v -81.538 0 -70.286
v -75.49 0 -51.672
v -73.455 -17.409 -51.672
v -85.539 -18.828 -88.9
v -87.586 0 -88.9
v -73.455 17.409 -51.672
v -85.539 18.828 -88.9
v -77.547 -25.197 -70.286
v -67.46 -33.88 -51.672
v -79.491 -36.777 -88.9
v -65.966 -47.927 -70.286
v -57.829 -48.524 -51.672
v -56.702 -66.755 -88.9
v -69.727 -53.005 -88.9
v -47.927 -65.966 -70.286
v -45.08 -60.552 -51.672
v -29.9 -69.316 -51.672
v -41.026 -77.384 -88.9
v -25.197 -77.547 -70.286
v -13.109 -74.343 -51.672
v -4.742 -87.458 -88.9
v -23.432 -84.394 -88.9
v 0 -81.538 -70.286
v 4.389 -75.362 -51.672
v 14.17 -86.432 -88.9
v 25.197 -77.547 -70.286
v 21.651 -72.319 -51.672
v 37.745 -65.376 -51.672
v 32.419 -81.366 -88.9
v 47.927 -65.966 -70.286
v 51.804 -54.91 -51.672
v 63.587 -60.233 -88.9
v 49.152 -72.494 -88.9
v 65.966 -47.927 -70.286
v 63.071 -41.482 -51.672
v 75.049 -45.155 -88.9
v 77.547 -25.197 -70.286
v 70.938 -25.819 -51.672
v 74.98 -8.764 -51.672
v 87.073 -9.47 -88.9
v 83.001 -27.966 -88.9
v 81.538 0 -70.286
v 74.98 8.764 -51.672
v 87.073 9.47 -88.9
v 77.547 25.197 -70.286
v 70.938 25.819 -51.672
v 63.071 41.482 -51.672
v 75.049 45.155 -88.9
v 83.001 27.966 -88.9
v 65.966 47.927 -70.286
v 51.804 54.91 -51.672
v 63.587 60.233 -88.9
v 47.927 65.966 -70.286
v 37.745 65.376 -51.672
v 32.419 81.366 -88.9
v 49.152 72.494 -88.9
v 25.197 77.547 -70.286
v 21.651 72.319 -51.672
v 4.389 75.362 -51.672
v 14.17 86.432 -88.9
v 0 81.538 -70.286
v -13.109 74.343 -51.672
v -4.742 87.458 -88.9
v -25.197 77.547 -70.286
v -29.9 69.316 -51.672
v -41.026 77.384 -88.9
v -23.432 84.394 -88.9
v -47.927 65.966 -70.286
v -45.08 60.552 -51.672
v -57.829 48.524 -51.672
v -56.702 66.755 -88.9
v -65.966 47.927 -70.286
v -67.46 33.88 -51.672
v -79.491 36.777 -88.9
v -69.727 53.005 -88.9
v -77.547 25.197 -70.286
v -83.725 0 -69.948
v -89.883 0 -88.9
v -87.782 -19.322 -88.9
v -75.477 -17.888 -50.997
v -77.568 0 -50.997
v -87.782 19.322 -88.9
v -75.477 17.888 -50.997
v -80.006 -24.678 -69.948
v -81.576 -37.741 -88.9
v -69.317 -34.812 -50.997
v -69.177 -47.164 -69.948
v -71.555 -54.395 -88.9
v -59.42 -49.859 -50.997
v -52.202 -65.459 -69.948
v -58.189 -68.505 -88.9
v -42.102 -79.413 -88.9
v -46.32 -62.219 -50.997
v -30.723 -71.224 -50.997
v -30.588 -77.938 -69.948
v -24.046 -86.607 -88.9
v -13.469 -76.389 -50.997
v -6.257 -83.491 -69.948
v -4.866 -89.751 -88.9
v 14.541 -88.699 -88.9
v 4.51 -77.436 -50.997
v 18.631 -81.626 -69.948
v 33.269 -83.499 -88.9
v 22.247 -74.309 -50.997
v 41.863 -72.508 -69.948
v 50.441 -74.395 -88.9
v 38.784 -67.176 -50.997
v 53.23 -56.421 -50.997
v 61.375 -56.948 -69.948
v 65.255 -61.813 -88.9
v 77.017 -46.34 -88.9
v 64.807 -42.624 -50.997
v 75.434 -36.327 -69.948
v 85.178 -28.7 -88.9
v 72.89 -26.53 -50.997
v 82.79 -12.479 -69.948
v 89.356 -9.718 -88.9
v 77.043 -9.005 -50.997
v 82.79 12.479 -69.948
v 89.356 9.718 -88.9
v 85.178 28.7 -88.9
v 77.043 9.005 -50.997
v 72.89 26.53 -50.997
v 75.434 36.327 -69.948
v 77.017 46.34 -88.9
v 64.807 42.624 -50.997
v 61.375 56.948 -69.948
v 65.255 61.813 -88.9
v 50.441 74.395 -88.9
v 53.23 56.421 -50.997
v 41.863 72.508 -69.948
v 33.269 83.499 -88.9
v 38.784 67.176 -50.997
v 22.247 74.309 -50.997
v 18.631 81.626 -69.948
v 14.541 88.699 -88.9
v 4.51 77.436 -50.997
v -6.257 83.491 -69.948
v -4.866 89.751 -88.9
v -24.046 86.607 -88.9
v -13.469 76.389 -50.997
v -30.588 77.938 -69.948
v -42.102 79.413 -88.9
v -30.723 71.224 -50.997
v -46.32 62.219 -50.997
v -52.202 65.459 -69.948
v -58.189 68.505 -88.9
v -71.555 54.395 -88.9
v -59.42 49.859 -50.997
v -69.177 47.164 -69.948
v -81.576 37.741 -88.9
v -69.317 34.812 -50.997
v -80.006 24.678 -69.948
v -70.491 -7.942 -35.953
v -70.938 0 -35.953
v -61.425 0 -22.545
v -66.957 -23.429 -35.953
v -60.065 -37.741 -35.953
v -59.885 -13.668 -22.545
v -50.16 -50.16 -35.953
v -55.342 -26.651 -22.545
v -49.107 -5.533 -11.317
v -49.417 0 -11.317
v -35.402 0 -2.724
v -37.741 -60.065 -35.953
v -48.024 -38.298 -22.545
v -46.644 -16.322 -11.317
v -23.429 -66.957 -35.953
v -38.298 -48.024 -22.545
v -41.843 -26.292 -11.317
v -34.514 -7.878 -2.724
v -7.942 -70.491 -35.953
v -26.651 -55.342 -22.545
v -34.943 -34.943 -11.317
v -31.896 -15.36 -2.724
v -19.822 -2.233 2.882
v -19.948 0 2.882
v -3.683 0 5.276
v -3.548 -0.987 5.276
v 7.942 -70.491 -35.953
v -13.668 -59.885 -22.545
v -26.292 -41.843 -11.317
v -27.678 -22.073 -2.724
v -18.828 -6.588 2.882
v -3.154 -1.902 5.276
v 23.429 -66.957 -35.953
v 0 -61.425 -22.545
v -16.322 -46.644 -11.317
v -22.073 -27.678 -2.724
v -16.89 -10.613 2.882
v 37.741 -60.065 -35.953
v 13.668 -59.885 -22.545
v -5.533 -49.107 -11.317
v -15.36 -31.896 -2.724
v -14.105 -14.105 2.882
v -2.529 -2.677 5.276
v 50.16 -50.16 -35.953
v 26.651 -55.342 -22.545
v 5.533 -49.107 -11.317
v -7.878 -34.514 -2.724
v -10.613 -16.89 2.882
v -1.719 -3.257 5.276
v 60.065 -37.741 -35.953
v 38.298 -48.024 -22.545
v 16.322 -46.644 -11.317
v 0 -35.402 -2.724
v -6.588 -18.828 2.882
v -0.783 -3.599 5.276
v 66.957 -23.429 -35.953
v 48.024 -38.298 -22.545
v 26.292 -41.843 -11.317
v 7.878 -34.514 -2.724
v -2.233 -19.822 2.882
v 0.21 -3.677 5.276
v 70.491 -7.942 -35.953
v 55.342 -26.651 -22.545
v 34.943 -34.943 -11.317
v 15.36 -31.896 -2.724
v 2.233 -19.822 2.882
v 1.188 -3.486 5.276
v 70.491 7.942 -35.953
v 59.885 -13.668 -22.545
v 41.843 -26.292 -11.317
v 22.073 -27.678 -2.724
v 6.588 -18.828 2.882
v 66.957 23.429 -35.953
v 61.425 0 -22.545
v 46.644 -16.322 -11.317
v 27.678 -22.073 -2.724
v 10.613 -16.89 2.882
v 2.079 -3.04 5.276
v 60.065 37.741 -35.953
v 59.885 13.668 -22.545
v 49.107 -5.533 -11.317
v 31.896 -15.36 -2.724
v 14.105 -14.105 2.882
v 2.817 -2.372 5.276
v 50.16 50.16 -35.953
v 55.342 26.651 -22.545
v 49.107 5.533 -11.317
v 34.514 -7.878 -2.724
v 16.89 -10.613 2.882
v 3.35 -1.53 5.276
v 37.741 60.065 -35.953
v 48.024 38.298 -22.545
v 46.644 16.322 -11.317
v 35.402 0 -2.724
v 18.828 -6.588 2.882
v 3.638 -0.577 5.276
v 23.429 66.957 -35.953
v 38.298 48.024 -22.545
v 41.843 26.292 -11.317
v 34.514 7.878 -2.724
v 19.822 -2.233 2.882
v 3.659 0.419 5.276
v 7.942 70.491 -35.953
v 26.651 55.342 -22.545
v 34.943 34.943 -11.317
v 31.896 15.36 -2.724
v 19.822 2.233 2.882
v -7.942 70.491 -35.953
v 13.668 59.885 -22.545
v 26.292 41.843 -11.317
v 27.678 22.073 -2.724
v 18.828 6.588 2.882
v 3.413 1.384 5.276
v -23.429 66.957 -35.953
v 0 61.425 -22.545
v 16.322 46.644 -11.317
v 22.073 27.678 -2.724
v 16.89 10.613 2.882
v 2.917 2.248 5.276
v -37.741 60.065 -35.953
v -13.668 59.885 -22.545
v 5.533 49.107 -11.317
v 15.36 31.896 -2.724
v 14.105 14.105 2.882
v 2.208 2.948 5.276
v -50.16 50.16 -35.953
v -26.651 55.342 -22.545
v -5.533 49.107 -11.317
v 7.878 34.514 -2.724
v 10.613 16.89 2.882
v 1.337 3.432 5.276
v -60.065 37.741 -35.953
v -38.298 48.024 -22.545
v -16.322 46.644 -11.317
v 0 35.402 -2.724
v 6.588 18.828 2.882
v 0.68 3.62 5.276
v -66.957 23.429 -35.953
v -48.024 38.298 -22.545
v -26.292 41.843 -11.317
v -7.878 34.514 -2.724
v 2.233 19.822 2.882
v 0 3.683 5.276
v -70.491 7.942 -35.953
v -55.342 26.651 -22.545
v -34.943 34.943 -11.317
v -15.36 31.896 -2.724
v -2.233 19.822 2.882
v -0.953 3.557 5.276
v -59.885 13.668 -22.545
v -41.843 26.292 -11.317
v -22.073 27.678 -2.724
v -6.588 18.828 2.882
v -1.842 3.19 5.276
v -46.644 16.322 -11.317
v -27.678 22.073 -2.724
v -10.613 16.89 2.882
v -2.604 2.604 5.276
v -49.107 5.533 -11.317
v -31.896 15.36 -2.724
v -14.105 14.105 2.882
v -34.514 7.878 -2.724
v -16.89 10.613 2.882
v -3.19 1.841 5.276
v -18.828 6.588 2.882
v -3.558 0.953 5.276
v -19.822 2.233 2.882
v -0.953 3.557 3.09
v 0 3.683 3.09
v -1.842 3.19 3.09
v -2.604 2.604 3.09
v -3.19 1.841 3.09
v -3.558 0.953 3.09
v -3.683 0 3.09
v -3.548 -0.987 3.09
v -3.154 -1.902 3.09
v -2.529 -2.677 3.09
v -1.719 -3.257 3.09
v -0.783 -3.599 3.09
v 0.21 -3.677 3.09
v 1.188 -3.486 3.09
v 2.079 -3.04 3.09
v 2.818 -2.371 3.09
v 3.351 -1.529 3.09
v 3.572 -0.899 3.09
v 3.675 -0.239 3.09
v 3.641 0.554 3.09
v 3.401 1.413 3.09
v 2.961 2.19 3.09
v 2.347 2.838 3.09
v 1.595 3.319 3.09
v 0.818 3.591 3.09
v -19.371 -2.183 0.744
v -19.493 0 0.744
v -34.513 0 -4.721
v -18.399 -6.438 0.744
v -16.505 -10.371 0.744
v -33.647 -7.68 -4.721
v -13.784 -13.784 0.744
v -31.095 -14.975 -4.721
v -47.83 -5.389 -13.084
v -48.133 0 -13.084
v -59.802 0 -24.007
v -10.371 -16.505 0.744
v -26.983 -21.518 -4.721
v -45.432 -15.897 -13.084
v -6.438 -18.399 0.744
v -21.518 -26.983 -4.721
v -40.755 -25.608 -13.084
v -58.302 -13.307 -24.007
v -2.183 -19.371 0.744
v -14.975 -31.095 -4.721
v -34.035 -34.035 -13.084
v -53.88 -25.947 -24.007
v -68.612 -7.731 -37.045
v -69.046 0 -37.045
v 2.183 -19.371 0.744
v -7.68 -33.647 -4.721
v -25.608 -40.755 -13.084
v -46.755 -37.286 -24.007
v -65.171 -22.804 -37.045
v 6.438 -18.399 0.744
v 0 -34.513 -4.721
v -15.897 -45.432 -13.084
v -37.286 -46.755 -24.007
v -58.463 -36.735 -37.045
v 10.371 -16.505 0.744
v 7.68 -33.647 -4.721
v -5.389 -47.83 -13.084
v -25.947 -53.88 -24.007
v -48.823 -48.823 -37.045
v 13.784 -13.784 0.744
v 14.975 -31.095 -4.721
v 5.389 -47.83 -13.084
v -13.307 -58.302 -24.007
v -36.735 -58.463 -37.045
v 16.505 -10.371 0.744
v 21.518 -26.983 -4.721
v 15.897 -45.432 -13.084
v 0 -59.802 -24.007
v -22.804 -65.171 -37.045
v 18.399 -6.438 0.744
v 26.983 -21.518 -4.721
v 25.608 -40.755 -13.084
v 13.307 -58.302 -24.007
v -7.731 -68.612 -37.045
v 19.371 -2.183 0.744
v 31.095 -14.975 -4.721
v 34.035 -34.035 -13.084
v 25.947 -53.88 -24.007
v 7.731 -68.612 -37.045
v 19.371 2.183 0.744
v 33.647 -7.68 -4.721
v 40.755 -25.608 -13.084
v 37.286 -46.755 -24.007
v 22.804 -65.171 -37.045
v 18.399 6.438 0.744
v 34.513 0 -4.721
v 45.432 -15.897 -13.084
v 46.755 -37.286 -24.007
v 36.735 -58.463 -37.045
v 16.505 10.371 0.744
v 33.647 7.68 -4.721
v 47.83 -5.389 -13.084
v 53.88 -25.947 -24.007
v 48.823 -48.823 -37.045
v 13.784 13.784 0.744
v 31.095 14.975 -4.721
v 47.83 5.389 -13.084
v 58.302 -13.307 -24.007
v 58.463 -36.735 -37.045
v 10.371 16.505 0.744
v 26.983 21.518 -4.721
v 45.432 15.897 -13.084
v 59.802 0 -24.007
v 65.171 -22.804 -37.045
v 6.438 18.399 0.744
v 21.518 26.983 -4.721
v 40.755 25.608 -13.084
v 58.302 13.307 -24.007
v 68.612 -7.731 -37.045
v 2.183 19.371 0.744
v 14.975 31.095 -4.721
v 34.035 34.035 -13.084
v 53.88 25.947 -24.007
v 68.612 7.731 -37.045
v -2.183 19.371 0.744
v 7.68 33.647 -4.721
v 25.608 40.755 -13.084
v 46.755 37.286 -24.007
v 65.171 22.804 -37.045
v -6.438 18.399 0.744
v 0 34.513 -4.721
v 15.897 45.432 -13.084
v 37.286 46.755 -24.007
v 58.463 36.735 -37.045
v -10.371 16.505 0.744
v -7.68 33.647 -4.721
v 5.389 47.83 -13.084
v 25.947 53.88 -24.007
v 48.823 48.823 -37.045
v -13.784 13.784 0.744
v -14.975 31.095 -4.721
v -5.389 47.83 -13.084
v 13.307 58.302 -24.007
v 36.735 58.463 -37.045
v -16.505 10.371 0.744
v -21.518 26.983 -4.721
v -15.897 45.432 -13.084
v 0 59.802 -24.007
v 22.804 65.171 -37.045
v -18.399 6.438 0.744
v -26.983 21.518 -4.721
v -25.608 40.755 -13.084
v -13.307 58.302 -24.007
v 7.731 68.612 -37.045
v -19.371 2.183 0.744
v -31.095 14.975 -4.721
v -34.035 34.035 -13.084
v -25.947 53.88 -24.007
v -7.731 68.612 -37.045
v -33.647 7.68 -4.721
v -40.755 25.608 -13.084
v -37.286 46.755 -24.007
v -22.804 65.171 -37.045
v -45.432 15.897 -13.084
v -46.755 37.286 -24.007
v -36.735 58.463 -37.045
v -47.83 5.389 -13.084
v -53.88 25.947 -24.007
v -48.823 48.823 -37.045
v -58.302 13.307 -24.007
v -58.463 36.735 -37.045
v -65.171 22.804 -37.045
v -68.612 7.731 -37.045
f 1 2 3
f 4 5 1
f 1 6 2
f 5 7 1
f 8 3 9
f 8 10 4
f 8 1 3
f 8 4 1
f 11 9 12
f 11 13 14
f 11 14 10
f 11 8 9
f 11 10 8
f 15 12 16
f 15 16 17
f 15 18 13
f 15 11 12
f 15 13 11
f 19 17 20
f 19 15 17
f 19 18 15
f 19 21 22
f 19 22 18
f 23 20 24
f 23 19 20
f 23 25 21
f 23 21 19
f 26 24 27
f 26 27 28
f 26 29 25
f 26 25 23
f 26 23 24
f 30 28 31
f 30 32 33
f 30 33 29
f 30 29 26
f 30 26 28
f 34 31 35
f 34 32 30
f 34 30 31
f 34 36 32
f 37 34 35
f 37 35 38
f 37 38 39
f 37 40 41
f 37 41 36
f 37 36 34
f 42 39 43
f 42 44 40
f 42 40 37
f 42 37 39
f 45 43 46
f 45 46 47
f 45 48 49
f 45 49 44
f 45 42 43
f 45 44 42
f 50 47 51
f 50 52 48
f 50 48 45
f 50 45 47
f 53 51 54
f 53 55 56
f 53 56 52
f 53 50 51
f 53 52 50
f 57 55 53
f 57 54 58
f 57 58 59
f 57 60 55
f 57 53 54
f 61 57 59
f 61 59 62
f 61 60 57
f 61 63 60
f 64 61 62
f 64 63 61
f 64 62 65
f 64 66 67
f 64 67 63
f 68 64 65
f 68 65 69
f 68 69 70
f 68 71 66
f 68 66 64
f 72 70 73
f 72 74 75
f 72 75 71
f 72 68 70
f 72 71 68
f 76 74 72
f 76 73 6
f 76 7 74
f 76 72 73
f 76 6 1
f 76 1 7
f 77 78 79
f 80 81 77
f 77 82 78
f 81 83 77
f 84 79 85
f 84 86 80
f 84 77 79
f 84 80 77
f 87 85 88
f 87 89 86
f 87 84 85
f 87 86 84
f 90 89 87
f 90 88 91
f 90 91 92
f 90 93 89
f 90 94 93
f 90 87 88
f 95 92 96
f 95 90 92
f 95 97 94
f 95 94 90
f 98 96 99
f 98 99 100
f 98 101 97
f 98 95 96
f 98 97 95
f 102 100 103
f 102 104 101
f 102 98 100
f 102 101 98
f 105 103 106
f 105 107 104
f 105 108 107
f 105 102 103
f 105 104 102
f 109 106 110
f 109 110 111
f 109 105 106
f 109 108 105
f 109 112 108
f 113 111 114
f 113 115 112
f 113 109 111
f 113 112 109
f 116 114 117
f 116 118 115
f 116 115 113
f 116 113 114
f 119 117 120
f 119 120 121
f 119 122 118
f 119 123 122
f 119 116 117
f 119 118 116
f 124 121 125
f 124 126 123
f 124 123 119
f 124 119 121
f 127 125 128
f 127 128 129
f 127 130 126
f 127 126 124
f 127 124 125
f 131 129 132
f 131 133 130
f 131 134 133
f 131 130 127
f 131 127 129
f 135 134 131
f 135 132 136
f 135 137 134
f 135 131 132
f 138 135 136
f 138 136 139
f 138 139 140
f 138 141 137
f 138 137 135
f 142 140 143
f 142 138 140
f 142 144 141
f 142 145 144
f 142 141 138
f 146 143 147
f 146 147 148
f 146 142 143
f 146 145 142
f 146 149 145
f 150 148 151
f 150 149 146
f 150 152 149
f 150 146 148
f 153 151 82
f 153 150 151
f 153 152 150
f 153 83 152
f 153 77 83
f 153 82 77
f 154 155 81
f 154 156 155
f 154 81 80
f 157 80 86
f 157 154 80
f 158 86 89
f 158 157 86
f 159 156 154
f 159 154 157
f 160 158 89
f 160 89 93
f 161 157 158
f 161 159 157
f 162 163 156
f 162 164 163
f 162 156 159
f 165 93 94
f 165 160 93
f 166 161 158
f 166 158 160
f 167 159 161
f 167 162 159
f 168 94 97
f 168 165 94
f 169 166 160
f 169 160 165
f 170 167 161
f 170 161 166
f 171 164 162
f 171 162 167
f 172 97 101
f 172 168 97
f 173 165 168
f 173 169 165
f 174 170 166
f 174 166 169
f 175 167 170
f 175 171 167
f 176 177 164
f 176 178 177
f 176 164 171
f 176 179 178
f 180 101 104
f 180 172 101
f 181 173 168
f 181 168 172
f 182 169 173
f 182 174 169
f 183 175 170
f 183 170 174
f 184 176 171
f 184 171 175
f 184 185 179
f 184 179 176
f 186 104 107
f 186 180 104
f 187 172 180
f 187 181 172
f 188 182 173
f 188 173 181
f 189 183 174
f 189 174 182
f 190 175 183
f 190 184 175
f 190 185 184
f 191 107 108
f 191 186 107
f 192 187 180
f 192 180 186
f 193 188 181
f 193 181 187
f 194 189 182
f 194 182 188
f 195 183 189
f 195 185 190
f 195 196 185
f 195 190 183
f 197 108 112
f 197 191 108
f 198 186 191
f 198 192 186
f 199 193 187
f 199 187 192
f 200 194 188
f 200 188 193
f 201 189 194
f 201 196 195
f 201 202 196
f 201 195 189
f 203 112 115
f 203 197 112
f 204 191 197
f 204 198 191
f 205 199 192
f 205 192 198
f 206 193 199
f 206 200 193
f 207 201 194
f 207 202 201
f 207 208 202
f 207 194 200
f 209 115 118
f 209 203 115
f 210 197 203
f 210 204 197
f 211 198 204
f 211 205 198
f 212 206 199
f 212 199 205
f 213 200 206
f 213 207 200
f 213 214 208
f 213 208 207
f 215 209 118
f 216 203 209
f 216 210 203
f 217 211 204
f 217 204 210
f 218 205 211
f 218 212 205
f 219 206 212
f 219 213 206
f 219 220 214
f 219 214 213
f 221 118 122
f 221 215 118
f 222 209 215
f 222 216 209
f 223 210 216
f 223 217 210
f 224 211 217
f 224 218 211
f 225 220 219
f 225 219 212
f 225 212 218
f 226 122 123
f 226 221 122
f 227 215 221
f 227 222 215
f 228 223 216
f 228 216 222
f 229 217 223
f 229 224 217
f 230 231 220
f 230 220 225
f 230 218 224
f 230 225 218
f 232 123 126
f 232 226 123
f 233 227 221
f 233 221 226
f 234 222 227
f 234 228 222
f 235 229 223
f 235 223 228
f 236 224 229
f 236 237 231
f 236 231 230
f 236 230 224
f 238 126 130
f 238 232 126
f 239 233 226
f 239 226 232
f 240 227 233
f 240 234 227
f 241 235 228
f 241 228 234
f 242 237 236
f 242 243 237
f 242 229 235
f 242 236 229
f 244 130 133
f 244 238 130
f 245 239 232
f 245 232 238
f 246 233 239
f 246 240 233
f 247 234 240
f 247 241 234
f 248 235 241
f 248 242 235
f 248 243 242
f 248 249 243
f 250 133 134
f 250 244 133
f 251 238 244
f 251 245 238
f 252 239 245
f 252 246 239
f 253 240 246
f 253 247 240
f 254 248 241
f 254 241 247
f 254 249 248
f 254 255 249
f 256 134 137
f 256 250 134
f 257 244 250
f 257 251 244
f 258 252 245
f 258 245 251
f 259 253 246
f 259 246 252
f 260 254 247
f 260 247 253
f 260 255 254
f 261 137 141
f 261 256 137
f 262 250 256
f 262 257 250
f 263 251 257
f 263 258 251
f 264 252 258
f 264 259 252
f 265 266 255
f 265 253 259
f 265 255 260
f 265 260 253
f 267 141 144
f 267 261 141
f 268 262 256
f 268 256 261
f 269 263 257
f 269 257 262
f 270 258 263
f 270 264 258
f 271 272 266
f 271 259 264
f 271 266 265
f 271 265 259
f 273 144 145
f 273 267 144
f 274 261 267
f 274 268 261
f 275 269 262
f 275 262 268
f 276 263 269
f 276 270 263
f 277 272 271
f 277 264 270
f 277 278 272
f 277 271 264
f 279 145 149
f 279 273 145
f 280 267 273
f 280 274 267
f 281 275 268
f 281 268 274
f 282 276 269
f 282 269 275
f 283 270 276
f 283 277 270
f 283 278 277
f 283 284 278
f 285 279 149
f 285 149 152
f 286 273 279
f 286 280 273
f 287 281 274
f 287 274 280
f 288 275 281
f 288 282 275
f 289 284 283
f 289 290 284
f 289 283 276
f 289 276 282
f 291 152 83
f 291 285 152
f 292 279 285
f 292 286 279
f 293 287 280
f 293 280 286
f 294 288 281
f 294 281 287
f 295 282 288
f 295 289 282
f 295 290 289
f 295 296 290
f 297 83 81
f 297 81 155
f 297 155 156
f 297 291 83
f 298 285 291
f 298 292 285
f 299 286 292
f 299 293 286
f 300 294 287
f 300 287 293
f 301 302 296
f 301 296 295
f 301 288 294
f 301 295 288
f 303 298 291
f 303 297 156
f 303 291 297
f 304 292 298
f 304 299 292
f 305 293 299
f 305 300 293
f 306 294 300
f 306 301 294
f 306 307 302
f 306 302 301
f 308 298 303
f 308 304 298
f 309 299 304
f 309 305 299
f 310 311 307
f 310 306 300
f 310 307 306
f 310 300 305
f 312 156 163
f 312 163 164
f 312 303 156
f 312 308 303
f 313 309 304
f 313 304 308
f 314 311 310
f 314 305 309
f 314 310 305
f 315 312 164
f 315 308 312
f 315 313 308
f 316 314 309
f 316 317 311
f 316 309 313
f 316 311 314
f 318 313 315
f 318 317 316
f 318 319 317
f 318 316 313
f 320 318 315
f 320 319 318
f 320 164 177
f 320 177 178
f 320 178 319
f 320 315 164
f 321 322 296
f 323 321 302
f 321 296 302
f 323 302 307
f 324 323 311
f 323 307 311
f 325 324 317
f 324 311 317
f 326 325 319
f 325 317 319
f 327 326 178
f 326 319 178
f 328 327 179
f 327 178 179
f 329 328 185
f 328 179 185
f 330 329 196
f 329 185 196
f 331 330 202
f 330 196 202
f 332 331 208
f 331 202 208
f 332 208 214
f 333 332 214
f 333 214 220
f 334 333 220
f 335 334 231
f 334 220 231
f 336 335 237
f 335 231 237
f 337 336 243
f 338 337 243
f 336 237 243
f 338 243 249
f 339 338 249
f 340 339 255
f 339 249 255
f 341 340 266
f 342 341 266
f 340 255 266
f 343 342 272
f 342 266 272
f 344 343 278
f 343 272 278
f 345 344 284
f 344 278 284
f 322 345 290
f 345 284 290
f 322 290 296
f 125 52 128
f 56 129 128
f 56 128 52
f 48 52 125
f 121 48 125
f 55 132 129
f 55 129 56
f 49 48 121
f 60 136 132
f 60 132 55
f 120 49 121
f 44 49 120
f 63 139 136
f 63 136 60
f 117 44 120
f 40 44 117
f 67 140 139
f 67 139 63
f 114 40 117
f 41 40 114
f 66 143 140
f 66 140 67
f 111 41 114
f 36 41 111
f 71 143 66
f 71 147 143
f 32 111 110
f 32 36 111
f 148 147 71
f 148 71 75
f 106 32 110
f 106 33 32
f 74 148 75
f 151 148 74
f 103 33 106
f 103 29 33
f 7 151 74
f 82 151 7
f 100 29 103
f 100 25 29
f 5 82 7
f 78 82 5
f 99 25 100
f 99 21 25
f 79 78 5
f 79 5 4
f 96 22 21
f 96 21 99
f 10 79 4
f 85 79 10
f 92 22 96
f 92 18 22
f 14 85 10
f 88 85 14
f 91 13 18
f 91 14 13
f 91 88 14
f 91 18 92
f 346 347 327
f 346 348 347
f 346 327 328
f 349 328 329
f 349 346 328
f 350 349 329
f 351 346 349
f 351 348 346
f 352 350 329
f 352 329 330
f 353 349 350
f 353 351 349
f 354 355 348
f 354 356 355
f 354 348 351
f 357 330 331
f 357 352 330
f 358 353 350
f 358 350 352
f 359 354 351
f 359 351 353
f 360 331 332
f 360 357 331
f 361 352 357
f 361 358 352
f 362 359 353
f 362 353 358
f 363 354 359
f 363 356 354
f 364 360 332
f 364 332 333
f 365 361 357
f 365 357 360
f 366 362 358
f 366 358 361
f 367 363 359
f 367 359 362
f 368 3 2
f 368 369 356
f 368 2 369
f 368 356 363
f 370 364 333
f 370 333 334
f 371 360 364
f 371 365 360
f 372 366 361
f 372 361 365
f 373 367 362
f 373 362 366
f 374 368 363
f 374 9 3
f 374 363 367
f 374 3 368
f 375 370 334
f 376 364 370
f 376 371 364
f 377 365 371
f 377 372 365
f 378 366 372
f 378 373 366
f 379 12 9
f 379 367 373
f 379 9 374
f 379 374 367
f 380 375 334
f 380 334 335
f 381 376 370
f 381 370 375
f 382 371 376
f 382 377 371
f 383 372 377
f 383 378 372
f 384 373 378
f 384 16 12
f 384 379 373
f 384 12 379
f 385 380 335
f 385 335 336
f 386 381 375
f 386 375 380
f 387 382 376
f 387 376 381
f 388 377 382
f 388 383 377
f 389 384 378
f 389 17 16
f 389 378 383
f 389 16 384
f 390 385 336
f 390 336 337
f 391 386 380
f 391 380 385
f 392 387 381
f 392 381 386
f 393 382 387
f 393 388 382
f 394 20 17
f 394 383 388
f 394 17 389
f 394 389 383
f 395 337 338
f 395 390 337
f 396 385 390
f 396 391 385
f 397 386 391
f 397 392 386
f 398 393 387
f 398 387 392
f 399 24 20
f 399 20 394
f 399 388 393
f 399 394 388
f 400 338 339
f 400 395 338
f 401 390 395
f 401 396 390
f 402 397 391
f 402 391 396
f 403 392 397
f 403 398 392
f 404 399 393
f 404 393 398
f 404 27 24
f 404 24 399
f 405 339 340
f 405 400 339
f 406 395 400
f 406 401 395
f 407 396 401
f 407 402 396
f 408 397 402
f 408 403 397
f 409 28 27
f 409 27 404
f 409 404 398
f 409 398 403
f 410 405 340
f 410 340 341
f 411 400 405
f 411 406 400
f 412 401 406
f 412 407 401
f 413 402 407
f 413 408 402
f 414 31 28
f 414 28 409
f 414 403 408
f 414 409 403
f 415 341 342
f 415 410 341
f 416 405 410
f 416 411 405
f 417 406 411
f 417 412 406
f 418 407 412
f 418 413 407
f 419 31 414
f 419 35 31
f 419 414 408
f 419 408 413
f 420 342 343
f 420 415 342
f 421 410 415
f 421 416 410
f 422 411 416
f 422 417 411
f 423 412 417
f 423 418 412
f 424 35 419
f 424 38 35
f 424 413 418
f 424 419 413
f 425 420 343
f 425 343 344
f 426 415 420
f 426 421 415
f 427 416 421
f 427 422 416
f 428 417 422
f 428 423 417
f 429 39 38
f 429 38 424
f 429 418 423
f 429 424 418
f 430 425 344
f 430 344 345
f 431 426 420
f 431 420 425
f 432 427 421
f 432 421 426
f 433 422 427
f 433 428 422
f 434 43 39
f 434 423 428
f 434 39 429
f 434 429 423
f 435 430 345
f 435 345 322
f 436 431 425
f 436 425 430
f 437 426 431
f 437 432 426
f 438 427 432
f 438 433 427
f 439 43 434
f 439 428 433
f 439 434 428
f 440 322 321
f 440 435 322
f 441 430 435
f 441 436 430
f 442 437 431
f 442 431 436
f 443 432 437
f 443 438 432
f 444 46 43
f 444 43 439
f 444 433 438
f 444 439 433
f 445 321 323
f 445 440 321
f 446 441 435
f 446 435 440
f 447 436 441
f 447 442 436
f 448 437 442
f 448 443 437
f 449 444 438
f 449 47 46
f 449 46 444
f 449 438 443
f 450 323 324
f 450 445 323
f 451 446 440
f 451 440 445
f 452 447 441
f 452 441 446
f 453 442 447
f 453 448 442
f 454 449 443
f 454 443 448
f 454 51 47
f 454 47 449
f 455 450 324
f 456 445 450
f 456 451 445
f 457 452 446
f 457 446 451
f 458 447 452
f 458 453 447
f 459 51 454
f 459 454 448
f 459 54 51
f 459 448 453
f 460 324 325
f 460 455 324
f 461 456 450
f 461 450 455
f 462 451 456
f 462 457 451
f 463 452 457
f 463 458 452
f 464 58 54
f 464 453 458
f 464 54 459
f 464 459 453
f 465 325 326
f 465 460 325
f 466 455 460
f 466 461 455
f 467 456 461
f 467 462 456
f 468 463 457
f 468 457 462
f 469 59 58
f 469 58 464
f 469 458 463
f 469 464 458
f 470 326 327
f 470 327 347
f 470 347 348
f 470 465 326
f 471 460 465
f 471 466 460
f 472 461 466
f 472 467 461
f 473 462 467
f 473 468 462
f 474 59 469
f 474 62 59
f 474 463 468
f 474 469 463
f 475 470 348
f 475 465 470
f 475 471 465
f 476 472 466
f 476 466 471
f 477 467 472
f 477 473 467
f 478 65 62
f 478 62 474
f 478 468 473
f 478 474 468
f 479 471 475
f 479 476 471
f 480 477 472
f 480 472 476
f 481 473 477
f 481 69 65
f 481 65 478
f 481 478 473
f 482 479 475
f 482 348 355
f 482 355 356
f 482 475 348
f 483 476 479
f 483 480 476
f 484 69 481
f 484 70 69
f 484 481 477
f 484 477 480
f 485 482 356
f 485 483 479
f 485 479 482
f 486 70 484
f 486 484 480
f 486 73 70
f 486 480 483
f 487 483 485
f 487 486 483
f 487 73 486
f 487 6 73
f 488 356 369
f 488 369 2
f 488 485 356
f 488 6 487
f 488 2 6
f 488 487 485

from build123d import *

# Parameters (mm, degrees)
SKETCH3_R                  = 3.683
CE_00_HOLE_AT_CENTER_DEPTH = 12.7


with BuildPart() as part:
    # Sketch1 → Revolve-Thin1 (revolve)
    with BuildSketch(Plane(origin=(0, 0, 0), x_dir=(0, 0, -1), z_dir=(1, 0, 0)), mode=Mode.PRIVATE) as revolve_thin1_sk:
        with BuildLine():
            ThreePointArc((-3.175, 0), (11.984276071, 46.655454401), (51.671776071, 75.490110981))
            Line((51.671776071, 75.490110981), (94.81101726, 89.506900124))
            ThreePointArc((94.81101726, 89.506900124), (97.98601726, 91.81367265), (99.198759346, 95.546109002))
            Line((99.198759346, 95.546109002), (99.198759346, 114.3))
            Line((99.198759346, 114.3), (97.014359346, 114.3))
            Line((97.014359346, 114.3), (97.014359346, 95.546109002))
            ThreePointArc((97.014359346, 95.546109002), (96.218800538, 93.097630755), (94.136000538, 91.584387978))
            Line((94.136000538, 91.584387978), (50.996759349, 77.567598835))
            ThreePointArc((50.996759349, 77.567598835), (10.217059349, 47.939412506), (-5.3594, 0))
            Line((-5.3594, 0), (-3.175, 0))
        make_face()
    revolve(revolve_thin1_sk.sketch.rotate(Axis((0, 0, -134.341700673), (0, 0, 1)), 90), axis=Axis((0, 0, -134.341700673), (0, 0, 1)))

    # Sketch5 → Cut-Revolve1 (revolve, cut)
    with BuildSketch(Plane(origin=(0, 0, 0), x_dir=(0, 0, -1), z_dir=(1, 0, 0))):
        with BuildLine():
            Line((-8.255, 0), (-23.88640598, 0))
            Line((-23.88640598, 0), (-23.88640598, 127.217845703))
            Line((-23.88640598, 127.217845703), (116.252745686, 127.217845703))
            Line((116.252745686, 127.217845703), (116.252745686, 73.62445992))
            Line((116.252745686, 73.62445992), (88.9, 73.62445992))
            Line((88.9, 73.62445992), (88.9, 92.92772229))
            Line((88.9, 92.92772229), (50.10196974, 80.321478084))
            ThreePointArc((50.10196974, 80.321478084), (7.87446974, 49.641403482), (-8.255, 0))
        make_face()
    revolve(axis=Axis((0, 0, -134.341700673), (0, 0, 1)), mode=Mode.SUBTRACT)

    # Sketch3 → CE-00 Hole at center (cut, symmetric)
    with BuildSketch(Plane.XY):
        with Locations(Location((0, 0, 0), (0, 0, 90))):
            Circle(SKETCH3_R)
    extrude(amount=CE_00_HOLE_AT_CENTER_DEPTH, both=True, mode=Mode.SUBTRACT)


solid = part.part
